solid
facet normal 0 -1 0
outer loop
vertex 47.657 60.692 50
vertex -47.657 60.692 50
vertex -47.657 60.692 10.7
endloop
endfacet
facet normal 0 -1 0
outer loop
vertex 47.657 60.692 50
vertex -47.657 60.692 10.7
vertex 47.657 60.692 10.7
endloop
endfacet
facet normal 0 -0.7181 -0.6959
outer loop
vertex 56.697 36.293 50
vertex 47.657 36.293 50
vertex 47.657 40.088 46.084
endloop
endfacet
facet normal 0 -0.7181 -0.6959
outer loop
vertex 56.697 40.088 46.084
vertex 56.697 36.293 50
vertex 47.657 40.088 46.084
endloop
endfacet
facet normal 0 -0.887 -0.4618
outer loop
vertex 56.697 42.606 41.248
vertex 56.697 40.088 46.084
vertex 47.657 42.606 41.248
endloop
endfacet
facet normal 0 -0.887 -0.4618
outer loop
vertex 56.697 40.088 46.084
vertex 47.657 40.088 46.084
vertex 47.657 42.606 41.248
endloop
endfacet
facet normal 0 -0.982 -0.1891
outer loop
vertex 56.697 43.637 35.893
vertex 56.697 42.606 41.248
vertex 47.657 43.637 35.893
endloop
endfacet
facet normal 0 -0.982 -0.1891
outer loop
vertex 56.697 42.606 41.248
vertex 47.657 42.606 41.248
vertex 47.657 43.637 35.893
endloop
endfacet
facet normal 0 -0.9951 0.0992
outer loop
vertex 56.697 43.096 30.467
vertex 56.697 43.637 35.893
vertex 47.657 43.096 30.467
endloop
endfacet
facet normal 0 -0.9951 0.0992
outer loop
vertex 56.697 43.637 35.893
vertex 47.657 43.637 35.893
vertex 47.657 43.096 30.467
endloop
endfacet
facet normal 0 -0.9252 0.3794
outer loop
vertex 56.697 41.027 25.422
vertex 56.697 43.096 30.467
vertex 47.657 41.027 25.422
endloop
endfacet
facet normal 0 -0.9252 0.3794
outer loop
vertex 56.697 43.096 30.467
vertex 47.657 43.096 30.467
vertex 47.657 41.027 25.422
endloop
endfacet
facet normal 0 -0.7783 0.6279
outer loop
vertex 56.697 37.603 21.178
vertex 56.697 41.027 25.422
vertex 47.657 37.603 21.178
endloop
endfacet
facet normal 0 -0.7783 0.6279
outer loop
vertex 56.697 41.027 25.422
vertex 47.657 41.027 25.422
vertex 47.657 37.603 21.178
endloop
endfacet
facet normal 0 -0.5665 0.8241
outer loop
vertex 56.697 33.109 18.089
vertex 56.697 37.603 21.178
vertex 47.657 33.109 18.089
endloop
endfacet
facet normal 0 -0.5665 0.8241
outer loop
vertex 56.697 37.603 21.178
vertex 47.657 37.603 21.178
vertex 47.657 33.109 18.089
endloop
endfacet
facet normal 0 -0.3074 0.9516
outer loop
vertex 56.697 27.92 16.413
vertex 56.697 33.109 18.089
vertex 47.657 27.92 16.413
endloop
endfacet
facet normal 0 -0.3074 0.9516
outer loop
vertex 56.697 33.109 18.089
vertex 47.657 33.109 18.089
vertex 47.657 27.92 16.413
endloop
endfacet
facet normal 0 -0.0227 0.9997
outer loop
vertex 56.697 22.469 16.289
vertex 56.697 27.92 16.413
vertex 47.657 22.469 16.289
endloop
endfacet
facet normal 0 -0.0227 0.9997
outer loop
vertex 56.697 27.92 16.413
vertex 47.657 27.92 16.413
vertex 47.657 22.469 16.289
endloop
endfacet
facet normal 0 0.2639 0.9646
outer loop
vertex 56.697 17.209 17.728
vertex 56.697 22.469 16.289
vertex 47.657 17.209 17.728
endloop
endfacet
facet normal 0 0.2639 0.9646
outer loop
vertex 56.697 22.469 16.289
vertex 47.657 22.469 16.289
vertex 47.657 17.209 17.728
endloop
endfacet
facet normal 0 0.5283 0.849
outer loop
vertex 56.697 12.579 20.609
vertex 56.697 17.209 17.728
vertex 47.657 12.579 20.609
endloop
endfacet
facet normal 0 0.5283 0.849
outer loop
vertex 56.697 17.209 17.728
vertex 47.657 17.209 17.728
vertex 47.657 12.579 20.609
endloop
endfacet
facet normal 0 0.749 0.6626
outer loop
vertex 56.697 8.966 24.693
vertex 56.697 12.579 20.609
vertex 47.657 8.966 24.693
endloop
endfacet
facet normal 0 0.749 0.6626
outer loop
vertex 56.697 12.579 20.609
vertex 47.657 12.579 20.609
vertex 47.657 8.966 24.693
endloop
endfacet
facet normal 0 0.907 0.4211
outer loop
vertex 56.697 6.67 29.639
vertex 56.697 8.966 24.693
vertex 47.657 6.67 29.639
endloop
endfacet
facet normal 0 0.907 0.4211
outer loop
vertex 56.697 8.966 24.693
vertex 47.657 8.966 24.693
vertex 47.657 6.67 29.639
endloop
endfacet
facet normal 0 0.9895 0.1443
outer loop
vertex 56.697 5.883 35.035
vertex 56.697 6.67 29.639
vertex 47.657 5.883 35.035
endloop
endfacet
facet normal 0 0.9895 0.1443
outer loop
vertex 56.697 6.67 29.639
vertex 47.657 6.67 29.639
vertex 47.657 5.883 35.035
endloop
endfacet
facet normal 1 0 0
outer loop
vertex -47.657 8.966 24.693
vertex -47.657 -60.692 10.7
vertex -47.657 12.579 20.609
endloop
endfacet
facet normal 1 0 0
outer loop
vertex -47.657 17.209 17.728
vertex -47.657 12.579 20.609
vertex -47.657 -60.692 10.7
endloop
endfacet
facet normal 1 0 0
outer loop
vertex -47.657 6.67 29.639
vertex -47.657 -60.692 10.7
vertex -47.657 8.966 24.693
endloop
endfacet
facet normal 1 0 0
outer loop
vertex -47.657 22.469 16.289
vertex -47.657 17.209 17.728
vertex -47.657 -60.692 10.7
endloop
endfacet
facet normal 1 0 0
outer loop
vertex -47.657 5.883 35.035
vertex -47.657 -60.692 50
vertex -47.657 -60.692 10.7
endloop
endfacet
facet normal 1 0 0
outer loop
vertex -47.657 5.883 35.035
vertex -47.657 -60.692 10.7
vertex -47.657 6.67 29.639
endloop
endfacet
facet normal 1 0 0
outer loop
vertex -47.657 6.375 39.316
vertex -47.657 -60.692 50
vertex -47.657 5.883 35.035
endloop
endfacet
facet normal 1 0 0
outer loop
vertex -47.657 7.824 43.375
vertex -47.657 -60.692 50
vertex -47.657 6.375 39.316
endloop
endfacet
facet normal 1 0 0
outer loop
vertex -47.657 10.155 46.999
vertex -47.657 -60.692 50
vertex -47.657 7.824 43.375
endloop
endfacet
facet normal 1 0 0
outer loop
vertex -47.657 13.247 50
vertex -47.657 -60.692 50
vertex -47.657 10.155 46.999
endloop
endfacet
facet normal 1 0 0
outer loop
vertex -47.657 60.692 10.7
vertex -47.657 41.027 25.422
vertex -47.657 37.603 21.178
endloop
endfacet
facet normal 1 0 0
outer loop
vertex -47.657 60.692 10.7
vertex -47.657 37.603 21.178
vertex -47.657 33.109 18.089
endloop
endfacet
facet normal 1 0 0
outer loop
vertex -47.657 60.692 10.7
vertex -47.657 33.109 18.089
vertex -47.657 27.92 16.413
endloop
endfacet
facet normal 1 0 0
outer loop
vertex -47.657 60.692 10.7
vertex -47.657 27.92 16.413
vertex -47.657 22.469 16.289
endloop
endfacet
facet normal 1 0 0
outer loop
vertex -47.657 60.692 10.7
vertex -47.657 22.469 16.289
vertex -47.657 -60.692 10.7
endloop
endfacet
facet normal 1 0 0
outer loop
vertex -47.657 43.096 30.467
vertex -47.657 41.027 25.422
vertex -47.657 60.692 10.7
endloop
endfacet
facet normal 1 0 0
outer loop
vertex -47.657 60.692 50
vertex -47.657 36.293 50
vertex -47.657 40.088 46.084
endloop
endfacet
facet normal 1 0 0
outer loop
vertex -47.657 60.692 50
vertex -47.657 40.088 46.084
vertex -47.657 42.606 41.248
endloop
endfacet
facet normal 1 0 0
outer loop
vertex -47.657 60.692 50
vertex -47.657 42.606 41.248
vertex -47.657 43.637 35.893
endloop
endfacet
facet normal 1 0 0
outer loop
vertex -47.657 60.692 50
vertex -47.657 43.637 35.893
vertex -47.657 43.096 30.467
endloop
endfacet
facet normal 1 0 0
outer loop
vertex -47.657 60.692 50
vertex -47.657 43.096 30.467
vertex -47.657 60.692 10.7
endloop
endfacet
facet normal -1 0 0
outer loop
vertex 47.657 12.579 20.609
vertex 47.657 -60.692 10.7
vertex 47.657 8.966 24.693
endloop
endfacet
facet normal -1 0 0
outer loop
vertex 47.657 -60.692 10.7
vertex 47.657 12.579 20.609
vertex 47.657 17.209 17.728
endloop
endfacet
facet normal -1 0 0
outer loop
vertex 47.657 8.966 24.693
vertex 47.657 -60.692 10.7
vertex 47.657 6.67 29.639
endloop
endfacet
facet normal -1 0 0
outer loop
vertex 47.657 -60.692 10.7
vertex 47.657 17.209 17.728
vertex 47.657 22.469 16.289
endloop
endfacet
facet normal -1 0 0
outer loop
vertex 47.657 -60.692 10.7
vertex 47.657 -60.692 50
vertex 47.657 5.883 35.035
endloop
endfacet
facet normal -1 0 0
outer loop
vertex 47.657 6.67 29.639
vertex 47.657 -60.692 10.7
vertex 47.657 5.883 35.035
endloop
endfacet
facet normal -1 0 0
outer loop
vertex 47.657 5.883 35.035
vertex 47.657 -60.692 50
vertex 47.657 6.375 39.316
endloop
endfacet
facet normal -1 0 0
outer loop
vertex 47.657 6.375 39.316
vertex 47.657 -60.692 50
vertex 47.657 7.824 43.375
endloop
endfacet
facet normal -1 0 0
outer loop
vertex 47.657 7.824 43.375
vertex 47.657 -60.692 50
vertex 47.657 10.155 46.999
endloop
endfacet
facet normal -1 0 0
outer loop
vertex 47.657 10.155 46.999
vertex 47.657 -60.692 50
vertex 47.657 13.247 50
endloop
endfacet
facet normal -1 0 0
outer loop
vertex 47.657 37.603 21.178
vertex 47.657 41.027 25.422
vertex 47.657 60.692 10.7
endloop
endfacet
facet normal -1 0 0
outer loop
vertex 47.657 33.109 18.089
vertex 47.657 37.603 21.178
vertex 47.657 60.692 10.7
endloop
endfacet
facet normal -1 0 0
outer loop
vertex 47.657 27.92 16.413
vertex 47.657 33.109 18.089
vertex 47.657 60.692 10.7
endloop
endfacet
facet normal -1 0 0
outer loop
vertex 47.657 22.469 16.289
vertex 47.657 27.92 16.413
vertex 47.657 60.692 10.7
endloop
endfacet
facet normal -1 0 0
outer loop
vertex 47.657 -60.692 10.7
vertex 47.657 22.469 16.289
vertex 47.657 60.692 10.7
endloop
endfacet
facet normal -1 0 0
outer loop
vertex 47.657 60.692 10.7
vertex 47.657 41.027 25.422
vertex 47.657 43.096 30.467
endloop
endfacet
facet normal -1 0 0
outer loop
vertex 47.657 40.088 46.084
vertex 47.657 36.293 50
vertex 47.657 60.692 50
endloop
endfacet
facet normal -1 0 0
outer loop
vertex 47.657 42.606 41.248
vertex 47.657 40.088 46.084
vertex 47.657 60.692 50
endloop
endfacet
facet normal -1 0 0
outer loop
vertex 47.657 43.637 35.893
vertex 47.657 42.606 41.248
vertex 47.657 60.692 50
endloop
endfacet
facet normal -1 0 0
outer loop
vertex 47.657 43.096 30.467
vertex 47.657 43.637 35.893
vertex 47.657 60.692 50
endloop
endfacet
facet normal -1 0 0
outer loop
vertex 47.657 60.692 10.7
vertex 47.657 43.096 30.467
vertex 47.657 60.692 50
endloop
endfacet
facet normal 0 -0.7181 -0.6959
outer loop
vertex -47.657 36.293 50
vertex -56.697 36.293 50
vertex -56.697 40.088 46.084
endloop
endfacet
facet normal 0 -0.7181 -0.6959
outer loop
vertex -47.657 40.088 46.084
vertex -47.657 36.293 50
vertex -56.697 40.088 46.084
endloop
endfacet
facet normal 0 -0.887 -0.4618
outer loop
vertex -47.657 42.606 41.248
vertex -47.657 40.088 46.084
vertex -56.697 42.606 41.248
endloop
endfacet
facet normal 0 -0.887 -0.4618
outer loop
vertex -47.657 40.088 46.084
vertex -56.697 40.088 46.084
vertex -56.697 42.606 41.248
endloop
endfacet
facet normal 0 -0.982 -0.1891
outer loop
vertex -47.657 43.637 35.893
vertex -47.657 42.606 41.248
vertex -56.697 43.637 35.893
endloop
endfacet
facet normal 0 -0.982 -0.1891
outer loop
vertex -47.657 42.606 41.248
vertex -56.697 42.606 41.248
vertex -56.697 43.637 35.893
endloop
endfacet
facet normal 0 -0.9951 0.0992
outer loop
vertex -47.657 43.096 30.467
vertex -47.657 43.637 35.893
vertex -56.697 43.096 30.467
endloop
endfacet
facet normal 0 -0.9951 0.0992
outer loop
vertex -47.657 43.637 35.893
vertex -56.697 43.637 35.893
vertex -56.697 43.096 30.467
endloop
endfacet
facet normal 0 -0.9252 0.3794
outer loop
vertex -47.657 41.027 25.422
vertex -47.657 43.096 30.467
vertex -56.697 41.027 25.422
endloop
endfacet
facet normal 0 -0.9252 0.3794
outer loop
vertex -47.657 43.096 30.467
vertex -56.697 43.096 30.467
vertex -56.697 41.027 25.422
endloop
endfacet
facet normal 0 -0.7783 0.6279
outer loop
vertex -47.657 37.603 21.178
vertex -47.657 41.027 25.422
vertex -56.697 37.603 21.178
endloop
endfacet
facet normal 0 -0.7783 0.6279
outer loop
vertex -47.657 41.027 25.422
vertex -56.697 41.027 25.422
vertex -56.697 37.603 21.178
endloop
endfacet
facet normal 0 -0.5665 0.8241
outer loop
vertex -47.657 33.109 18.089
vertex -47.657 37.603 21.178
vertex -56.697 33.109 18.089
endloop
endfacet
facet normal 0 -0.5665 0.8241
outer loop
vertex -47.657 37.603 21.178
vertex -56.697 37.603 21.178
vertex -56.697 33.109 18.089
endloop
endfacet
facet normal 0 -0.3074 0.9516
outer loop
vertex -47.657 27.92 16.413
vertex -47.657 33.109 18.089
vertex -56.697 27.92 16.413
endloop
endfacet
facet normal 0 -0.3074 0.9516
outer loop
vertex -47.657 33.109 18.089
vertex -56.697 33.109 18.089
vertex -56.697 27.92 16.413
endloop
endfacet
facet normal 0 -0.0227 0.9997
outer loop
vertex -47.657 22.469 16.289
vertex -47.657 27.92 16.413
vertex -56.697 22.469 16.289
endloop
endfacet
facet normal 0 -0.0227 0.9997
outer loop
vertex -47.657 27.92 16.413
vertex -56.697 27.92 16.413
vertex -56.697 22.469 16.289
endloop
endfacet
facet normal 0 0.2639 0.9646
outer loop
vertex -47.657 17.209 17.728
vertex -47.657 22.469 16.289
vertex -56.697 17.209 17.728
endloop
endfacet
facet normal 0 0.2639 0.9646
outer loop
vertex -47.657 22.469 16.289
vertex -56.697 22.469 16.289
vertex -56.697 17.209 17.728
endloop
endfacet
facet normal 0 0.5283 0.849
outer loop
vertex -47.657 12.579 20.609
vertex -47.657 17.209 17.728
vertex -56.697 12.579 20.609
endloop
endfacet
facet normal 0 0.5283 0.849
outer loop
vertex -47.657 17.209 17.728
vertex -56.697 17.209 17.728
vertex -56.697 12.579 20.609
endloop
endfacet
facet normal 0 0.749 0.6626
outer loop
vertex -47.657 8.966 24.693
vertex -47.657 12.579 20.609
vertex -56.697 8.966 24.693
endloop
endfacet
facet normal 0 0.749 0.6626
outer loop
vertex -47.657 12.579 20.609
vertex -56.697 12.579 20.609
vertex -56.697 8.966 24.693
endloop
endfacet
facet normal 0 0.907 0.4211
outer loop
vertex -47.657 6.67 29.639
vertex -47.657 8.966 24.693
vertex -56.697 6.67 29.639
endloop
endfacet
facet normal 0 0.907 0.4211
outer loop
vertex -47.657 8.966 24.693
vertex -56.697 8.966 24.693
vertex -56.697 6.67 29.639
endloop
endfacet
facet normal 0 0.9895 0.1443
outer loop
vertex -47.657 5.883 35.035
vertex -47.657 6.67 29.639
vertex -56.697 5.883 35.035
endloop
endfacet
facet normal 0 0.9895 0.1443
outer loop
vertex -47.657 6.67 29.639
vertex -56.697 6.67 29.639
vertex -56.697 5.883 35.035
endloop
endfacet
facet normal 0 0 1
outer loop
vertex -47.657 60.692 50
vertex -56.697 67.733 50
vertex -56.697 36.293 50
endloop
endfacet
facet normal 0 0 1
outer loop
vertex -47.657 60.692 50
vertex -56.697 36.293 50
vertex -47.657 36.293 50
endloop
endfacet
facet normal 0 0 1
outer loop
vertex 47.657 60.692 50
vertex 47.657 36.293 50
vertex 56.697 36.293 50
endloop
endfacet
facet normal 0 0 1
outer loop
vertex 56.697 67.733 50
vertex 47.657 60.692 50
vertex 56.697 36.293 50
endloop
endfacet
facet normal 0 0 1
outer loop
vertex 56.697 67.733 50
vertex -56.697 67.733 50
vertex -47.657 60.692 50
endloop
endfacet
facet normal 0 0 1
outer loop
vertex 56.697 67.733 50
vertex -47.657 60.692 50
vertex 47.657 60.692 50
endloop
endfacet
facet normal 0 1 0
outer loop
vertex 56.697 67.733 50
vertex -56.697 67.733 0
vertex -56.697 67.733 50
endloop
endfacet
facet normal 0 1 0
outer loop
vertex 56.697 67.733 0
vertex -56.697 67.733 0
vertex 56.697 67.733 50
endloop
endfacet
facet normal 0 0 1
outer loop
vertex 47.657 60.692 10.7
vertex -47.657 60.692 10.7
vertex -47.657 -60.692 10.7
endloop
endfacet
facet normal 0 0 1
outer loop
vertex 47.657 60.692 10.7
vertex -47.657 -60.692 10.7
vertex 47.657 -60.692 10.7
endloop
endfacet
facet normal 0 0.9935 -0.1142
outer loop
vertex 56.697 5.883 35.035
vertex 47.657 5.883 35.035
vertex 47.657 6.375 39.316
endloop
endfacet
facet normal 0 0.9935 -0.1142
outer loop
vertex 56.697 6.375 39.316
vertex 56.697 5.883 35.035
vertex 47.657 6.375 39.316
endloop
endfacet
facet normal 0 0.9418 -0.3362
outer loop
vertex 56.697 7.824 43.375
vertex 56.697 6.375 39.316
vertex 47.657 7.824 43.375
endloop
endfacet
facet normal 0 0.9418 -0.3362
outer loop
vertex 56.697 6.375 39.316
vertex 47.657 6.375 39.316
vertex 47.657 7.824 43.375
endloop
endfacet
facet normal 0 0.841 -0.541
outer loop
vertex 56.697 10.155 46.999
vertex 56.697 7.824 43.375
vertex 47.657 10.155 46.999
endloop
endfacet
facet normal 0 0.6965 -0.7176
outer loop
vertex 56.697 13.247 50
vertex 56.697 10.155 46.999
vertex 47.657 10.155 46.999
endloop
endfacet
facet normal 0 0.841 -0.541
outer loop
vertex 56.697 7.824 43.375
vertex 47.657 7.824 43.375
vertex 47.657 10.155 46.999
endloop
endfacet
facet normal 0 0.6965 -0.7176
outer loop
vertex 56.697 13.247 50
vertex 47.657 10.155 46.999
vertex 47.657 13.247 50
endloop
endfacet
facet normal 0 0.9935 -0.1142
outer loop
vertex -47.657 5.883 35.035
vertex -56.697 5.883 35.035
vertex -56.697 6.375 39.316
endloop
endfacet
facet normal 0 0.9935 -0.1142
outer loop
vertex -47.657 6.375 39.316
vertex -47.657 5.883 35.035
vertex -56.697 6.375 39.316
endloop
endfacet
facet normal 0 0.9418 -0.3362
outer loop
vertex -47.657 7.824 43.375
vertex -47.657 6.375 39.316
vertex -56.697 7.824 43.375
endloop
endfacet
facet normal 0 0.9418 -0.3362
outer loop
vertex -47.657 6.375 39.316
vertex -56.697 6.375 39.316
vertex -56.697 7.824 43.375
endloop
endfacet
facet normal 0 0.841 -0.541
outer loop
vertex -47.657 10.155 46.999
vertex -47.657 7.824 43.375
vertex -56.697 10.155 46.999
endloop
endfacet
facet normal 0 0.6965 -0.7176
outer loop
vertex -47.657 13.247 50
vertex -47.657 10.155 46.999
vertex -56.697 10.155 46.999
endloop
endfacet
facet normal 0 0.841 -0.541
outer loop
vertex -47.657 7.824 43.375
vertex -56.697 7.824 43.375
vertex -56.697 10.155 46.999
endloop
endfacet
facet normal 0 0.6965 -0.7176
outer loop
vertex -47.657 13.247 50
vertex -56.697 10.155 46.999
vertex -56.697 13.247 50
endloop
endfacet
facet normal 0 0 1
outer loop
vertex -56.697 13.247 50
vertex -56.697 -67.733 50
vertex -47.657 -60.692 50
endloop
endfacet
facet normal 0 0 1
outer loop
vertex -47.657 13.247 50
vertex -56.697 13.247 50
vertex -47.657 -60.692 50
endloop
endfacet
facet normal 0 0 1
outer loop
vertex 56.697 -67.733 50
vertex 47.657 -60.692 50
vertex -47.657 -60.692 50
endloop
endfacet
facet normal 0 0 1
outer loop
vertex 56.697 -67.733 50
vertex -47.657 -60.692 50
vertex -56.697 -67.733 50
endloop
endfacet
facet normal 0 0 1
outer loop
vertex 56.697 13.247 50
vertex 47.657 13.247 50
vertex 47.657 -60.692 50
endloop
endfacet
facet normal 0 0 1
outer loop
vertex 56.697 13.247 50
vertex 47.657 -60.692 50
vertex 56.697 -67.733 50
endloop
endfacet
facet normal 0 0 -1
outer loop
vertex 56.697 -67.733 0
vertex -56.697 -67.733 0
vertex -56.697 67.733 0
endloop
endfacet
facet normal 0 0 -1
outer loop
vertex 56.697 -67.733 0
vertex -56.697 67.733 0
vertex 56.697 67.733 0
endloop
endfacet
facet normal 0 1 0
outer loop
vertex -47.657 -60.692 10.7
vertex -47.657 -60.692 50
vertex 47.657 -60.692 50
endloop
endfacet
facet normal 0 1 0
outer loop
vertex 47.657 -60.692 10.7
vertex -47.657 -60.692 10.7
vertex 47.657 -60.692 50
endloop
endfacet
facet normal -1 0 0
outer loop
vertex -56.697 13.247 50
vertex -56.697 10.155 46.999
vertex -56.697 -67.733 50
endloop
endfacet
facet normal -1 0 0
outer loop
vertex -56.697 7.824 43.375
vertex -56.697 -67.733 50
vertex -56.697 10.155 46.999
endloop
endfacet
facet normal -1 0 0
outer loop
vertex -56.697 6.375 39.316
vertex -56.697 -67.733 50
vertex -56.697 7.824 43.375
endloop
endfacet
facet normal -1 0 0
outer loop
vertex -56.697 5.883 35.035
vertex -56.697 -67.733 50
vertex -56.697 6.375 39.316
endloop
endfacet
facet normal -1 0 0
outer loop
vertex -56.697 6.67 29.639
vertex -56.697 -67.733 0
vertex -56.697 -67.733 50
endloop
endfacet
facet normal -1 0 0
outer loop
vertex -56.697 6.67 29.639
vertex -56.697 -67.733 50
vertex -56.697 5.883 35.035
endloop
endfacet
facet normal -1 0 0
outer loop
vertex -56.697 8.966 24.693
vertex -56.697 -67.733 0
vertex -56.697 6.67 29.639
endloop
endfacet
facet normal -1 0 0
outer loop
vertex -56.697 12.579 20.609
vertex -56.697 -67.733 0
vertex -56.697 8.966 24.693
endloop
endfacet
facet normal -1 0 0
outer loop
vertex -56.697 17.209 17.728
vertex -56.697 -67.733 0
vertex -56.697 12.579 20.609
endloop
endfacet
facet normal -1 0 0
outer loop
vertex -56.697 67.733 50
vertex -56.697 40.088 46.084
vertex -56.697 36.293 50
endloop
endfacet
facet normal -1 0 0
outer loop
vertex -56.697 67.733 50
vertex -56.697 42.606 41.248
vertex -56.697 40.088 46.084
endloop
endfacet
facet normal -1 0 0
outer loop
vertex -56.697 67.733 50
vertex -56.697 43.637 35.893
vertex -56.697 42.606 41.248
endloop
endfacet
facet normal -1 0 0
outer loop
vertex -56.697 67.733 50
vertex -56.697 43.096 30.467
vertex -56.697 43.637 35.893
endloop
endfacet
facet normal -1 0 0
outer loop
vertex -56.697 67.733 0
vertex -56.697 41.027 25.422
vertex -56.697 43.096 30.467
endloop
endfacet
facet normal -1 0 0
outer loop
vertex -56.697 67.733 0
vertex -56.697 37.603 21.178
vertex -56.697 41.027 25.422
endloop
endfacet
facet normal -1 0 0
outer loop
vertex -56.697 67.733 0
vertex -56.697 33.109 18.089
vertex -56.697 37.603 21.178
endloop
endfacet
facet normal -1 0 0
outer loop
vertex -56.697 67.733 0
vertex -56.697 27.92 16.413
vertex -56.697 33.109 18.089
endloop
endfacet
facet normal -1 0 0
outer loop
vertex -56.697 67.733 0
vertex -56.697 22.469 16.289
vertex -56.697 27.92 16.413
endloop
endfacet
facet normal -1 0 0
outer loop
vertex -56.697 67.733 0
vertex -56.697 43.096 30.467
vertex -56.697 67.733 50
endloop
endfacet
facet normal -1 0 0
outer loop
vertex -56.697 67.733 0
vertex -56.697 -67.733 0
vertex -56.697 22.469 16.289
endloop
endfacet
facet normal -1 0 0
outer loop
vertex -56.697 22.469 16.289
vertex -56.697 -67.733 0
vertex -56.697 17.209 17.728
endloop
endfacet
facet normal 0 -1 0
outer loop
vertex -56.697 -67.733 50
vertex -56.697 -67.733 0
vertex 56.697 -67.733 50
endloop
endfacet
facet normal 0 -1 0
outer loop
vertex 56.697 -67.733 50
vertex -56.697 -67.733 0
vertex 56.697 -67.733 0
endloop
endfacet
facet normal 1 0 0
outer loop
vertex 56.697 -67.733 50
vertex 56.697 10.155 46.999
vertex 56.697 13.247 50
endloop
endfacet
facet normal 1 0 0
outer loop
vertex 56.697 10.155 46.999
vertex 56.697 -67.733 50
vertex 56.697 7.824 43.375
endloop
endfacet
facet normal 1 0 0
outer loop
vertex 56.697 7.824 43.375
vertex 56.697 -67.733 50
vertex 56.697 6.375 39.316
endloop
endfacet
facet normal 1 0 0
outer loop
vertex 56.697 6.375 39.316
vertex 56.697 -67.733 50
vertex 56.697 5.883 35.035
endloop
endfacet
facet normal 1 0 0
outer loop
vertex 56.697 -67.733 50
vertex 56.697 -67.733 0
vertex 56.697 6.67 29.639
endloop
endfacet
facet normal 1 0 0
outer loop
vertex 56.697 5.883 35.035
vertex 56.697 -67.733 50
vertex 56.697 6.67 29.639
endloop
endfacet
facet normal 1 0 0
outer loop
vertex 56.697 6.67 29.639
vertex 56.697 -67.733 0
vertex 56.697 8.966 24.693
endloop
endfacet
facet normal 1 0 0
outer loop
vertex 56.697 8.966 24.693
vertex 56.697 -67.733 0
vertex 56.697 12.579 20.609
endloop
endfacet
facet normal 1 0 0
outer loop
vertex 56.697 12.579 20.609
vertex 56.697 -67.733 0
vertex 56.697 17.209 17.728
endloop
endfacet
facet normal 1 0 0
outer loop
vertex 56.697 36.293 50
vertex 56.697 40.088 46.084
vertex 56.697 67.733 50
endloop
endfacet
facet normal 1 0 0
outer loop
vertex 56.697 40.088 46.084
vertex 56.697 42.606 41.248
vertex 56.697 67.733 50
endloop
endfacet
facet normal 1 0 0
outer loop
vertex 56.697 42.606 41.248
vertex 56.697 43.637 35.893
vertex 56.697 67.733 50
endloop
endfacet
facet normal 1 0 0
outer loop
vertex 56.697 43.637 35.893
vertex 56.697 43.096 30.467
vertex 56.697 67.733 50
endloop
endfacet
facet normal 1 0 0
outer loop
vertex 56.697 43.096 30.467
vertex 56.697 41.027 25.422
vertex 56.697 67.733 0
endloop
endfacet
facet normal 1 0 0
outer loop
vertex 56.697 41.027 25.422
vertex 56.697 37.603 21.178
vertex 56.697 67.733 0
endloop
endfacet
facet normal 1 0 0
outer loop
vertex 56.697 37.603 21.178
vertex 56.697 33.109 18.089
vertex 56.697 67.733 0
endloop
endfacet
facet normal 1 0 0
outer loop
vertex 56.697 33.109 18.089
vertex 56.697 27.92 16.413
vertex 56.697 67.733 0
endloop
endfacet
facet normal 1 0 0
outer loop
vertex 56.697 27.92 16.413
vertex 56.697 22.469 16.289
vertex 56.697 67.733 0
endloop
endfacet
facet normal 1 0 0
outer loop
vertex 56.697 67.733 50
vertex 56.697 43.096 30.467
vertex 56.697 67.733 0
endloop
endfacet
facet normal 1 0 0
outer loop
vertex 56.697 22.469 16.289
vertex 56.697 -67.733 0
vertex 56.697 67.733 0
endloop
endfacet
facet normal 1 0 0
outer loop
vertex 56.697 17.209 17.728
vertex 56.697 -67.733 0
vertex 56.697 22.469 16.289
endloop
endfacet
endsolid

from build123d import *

# Parameters (mm, degrees)
F0_W     = 113.393486
F0_H     = 135.465204
F1_DEPTH = 50
F2_W     = 95.314652
F2_H     = 121.38363
F3_DEPTH = 39.3
F5_DEPTH = 200


with BuildPart() as f1:
    # F0 (on Top) → F1 (new body)
    with BuildSketch(Plane.XY):
        Rectangle(F0_W, F0_H)
    extrude(amount=F1_DEPTH)

    # F2 (on face) → F3 (cut)
    with BuildSketch(Plane.XY.offset(50)):
        Rectangle(F2_W, F2_H)
    extrude(amount=-F3_DEPTH, mode=Mode.SUBTRACT)

    # F4 (on face) → F5 (cut)
    with BuildSketch(Plane(origin=(-56.696743, 0, 0), x_dir=(0, -1, 0), z_dir=(-1, 0, 0))):
        with BuildLine():
            ThreePointArc((-36.292743, 50), (-33.109312, 18.08902), (-5.88302, 35.035226))
            ThreePointArc((-5.88302, 35.035226), (-7.823794, 43.374538), (-13.247259, 50))
            Line((-13.247259, 50), (-36.292743, 50))
        make_face()
    extrude(amount=-F5_DEPTH, mode=Mode.SUBTRACT)


solid = f1.part
